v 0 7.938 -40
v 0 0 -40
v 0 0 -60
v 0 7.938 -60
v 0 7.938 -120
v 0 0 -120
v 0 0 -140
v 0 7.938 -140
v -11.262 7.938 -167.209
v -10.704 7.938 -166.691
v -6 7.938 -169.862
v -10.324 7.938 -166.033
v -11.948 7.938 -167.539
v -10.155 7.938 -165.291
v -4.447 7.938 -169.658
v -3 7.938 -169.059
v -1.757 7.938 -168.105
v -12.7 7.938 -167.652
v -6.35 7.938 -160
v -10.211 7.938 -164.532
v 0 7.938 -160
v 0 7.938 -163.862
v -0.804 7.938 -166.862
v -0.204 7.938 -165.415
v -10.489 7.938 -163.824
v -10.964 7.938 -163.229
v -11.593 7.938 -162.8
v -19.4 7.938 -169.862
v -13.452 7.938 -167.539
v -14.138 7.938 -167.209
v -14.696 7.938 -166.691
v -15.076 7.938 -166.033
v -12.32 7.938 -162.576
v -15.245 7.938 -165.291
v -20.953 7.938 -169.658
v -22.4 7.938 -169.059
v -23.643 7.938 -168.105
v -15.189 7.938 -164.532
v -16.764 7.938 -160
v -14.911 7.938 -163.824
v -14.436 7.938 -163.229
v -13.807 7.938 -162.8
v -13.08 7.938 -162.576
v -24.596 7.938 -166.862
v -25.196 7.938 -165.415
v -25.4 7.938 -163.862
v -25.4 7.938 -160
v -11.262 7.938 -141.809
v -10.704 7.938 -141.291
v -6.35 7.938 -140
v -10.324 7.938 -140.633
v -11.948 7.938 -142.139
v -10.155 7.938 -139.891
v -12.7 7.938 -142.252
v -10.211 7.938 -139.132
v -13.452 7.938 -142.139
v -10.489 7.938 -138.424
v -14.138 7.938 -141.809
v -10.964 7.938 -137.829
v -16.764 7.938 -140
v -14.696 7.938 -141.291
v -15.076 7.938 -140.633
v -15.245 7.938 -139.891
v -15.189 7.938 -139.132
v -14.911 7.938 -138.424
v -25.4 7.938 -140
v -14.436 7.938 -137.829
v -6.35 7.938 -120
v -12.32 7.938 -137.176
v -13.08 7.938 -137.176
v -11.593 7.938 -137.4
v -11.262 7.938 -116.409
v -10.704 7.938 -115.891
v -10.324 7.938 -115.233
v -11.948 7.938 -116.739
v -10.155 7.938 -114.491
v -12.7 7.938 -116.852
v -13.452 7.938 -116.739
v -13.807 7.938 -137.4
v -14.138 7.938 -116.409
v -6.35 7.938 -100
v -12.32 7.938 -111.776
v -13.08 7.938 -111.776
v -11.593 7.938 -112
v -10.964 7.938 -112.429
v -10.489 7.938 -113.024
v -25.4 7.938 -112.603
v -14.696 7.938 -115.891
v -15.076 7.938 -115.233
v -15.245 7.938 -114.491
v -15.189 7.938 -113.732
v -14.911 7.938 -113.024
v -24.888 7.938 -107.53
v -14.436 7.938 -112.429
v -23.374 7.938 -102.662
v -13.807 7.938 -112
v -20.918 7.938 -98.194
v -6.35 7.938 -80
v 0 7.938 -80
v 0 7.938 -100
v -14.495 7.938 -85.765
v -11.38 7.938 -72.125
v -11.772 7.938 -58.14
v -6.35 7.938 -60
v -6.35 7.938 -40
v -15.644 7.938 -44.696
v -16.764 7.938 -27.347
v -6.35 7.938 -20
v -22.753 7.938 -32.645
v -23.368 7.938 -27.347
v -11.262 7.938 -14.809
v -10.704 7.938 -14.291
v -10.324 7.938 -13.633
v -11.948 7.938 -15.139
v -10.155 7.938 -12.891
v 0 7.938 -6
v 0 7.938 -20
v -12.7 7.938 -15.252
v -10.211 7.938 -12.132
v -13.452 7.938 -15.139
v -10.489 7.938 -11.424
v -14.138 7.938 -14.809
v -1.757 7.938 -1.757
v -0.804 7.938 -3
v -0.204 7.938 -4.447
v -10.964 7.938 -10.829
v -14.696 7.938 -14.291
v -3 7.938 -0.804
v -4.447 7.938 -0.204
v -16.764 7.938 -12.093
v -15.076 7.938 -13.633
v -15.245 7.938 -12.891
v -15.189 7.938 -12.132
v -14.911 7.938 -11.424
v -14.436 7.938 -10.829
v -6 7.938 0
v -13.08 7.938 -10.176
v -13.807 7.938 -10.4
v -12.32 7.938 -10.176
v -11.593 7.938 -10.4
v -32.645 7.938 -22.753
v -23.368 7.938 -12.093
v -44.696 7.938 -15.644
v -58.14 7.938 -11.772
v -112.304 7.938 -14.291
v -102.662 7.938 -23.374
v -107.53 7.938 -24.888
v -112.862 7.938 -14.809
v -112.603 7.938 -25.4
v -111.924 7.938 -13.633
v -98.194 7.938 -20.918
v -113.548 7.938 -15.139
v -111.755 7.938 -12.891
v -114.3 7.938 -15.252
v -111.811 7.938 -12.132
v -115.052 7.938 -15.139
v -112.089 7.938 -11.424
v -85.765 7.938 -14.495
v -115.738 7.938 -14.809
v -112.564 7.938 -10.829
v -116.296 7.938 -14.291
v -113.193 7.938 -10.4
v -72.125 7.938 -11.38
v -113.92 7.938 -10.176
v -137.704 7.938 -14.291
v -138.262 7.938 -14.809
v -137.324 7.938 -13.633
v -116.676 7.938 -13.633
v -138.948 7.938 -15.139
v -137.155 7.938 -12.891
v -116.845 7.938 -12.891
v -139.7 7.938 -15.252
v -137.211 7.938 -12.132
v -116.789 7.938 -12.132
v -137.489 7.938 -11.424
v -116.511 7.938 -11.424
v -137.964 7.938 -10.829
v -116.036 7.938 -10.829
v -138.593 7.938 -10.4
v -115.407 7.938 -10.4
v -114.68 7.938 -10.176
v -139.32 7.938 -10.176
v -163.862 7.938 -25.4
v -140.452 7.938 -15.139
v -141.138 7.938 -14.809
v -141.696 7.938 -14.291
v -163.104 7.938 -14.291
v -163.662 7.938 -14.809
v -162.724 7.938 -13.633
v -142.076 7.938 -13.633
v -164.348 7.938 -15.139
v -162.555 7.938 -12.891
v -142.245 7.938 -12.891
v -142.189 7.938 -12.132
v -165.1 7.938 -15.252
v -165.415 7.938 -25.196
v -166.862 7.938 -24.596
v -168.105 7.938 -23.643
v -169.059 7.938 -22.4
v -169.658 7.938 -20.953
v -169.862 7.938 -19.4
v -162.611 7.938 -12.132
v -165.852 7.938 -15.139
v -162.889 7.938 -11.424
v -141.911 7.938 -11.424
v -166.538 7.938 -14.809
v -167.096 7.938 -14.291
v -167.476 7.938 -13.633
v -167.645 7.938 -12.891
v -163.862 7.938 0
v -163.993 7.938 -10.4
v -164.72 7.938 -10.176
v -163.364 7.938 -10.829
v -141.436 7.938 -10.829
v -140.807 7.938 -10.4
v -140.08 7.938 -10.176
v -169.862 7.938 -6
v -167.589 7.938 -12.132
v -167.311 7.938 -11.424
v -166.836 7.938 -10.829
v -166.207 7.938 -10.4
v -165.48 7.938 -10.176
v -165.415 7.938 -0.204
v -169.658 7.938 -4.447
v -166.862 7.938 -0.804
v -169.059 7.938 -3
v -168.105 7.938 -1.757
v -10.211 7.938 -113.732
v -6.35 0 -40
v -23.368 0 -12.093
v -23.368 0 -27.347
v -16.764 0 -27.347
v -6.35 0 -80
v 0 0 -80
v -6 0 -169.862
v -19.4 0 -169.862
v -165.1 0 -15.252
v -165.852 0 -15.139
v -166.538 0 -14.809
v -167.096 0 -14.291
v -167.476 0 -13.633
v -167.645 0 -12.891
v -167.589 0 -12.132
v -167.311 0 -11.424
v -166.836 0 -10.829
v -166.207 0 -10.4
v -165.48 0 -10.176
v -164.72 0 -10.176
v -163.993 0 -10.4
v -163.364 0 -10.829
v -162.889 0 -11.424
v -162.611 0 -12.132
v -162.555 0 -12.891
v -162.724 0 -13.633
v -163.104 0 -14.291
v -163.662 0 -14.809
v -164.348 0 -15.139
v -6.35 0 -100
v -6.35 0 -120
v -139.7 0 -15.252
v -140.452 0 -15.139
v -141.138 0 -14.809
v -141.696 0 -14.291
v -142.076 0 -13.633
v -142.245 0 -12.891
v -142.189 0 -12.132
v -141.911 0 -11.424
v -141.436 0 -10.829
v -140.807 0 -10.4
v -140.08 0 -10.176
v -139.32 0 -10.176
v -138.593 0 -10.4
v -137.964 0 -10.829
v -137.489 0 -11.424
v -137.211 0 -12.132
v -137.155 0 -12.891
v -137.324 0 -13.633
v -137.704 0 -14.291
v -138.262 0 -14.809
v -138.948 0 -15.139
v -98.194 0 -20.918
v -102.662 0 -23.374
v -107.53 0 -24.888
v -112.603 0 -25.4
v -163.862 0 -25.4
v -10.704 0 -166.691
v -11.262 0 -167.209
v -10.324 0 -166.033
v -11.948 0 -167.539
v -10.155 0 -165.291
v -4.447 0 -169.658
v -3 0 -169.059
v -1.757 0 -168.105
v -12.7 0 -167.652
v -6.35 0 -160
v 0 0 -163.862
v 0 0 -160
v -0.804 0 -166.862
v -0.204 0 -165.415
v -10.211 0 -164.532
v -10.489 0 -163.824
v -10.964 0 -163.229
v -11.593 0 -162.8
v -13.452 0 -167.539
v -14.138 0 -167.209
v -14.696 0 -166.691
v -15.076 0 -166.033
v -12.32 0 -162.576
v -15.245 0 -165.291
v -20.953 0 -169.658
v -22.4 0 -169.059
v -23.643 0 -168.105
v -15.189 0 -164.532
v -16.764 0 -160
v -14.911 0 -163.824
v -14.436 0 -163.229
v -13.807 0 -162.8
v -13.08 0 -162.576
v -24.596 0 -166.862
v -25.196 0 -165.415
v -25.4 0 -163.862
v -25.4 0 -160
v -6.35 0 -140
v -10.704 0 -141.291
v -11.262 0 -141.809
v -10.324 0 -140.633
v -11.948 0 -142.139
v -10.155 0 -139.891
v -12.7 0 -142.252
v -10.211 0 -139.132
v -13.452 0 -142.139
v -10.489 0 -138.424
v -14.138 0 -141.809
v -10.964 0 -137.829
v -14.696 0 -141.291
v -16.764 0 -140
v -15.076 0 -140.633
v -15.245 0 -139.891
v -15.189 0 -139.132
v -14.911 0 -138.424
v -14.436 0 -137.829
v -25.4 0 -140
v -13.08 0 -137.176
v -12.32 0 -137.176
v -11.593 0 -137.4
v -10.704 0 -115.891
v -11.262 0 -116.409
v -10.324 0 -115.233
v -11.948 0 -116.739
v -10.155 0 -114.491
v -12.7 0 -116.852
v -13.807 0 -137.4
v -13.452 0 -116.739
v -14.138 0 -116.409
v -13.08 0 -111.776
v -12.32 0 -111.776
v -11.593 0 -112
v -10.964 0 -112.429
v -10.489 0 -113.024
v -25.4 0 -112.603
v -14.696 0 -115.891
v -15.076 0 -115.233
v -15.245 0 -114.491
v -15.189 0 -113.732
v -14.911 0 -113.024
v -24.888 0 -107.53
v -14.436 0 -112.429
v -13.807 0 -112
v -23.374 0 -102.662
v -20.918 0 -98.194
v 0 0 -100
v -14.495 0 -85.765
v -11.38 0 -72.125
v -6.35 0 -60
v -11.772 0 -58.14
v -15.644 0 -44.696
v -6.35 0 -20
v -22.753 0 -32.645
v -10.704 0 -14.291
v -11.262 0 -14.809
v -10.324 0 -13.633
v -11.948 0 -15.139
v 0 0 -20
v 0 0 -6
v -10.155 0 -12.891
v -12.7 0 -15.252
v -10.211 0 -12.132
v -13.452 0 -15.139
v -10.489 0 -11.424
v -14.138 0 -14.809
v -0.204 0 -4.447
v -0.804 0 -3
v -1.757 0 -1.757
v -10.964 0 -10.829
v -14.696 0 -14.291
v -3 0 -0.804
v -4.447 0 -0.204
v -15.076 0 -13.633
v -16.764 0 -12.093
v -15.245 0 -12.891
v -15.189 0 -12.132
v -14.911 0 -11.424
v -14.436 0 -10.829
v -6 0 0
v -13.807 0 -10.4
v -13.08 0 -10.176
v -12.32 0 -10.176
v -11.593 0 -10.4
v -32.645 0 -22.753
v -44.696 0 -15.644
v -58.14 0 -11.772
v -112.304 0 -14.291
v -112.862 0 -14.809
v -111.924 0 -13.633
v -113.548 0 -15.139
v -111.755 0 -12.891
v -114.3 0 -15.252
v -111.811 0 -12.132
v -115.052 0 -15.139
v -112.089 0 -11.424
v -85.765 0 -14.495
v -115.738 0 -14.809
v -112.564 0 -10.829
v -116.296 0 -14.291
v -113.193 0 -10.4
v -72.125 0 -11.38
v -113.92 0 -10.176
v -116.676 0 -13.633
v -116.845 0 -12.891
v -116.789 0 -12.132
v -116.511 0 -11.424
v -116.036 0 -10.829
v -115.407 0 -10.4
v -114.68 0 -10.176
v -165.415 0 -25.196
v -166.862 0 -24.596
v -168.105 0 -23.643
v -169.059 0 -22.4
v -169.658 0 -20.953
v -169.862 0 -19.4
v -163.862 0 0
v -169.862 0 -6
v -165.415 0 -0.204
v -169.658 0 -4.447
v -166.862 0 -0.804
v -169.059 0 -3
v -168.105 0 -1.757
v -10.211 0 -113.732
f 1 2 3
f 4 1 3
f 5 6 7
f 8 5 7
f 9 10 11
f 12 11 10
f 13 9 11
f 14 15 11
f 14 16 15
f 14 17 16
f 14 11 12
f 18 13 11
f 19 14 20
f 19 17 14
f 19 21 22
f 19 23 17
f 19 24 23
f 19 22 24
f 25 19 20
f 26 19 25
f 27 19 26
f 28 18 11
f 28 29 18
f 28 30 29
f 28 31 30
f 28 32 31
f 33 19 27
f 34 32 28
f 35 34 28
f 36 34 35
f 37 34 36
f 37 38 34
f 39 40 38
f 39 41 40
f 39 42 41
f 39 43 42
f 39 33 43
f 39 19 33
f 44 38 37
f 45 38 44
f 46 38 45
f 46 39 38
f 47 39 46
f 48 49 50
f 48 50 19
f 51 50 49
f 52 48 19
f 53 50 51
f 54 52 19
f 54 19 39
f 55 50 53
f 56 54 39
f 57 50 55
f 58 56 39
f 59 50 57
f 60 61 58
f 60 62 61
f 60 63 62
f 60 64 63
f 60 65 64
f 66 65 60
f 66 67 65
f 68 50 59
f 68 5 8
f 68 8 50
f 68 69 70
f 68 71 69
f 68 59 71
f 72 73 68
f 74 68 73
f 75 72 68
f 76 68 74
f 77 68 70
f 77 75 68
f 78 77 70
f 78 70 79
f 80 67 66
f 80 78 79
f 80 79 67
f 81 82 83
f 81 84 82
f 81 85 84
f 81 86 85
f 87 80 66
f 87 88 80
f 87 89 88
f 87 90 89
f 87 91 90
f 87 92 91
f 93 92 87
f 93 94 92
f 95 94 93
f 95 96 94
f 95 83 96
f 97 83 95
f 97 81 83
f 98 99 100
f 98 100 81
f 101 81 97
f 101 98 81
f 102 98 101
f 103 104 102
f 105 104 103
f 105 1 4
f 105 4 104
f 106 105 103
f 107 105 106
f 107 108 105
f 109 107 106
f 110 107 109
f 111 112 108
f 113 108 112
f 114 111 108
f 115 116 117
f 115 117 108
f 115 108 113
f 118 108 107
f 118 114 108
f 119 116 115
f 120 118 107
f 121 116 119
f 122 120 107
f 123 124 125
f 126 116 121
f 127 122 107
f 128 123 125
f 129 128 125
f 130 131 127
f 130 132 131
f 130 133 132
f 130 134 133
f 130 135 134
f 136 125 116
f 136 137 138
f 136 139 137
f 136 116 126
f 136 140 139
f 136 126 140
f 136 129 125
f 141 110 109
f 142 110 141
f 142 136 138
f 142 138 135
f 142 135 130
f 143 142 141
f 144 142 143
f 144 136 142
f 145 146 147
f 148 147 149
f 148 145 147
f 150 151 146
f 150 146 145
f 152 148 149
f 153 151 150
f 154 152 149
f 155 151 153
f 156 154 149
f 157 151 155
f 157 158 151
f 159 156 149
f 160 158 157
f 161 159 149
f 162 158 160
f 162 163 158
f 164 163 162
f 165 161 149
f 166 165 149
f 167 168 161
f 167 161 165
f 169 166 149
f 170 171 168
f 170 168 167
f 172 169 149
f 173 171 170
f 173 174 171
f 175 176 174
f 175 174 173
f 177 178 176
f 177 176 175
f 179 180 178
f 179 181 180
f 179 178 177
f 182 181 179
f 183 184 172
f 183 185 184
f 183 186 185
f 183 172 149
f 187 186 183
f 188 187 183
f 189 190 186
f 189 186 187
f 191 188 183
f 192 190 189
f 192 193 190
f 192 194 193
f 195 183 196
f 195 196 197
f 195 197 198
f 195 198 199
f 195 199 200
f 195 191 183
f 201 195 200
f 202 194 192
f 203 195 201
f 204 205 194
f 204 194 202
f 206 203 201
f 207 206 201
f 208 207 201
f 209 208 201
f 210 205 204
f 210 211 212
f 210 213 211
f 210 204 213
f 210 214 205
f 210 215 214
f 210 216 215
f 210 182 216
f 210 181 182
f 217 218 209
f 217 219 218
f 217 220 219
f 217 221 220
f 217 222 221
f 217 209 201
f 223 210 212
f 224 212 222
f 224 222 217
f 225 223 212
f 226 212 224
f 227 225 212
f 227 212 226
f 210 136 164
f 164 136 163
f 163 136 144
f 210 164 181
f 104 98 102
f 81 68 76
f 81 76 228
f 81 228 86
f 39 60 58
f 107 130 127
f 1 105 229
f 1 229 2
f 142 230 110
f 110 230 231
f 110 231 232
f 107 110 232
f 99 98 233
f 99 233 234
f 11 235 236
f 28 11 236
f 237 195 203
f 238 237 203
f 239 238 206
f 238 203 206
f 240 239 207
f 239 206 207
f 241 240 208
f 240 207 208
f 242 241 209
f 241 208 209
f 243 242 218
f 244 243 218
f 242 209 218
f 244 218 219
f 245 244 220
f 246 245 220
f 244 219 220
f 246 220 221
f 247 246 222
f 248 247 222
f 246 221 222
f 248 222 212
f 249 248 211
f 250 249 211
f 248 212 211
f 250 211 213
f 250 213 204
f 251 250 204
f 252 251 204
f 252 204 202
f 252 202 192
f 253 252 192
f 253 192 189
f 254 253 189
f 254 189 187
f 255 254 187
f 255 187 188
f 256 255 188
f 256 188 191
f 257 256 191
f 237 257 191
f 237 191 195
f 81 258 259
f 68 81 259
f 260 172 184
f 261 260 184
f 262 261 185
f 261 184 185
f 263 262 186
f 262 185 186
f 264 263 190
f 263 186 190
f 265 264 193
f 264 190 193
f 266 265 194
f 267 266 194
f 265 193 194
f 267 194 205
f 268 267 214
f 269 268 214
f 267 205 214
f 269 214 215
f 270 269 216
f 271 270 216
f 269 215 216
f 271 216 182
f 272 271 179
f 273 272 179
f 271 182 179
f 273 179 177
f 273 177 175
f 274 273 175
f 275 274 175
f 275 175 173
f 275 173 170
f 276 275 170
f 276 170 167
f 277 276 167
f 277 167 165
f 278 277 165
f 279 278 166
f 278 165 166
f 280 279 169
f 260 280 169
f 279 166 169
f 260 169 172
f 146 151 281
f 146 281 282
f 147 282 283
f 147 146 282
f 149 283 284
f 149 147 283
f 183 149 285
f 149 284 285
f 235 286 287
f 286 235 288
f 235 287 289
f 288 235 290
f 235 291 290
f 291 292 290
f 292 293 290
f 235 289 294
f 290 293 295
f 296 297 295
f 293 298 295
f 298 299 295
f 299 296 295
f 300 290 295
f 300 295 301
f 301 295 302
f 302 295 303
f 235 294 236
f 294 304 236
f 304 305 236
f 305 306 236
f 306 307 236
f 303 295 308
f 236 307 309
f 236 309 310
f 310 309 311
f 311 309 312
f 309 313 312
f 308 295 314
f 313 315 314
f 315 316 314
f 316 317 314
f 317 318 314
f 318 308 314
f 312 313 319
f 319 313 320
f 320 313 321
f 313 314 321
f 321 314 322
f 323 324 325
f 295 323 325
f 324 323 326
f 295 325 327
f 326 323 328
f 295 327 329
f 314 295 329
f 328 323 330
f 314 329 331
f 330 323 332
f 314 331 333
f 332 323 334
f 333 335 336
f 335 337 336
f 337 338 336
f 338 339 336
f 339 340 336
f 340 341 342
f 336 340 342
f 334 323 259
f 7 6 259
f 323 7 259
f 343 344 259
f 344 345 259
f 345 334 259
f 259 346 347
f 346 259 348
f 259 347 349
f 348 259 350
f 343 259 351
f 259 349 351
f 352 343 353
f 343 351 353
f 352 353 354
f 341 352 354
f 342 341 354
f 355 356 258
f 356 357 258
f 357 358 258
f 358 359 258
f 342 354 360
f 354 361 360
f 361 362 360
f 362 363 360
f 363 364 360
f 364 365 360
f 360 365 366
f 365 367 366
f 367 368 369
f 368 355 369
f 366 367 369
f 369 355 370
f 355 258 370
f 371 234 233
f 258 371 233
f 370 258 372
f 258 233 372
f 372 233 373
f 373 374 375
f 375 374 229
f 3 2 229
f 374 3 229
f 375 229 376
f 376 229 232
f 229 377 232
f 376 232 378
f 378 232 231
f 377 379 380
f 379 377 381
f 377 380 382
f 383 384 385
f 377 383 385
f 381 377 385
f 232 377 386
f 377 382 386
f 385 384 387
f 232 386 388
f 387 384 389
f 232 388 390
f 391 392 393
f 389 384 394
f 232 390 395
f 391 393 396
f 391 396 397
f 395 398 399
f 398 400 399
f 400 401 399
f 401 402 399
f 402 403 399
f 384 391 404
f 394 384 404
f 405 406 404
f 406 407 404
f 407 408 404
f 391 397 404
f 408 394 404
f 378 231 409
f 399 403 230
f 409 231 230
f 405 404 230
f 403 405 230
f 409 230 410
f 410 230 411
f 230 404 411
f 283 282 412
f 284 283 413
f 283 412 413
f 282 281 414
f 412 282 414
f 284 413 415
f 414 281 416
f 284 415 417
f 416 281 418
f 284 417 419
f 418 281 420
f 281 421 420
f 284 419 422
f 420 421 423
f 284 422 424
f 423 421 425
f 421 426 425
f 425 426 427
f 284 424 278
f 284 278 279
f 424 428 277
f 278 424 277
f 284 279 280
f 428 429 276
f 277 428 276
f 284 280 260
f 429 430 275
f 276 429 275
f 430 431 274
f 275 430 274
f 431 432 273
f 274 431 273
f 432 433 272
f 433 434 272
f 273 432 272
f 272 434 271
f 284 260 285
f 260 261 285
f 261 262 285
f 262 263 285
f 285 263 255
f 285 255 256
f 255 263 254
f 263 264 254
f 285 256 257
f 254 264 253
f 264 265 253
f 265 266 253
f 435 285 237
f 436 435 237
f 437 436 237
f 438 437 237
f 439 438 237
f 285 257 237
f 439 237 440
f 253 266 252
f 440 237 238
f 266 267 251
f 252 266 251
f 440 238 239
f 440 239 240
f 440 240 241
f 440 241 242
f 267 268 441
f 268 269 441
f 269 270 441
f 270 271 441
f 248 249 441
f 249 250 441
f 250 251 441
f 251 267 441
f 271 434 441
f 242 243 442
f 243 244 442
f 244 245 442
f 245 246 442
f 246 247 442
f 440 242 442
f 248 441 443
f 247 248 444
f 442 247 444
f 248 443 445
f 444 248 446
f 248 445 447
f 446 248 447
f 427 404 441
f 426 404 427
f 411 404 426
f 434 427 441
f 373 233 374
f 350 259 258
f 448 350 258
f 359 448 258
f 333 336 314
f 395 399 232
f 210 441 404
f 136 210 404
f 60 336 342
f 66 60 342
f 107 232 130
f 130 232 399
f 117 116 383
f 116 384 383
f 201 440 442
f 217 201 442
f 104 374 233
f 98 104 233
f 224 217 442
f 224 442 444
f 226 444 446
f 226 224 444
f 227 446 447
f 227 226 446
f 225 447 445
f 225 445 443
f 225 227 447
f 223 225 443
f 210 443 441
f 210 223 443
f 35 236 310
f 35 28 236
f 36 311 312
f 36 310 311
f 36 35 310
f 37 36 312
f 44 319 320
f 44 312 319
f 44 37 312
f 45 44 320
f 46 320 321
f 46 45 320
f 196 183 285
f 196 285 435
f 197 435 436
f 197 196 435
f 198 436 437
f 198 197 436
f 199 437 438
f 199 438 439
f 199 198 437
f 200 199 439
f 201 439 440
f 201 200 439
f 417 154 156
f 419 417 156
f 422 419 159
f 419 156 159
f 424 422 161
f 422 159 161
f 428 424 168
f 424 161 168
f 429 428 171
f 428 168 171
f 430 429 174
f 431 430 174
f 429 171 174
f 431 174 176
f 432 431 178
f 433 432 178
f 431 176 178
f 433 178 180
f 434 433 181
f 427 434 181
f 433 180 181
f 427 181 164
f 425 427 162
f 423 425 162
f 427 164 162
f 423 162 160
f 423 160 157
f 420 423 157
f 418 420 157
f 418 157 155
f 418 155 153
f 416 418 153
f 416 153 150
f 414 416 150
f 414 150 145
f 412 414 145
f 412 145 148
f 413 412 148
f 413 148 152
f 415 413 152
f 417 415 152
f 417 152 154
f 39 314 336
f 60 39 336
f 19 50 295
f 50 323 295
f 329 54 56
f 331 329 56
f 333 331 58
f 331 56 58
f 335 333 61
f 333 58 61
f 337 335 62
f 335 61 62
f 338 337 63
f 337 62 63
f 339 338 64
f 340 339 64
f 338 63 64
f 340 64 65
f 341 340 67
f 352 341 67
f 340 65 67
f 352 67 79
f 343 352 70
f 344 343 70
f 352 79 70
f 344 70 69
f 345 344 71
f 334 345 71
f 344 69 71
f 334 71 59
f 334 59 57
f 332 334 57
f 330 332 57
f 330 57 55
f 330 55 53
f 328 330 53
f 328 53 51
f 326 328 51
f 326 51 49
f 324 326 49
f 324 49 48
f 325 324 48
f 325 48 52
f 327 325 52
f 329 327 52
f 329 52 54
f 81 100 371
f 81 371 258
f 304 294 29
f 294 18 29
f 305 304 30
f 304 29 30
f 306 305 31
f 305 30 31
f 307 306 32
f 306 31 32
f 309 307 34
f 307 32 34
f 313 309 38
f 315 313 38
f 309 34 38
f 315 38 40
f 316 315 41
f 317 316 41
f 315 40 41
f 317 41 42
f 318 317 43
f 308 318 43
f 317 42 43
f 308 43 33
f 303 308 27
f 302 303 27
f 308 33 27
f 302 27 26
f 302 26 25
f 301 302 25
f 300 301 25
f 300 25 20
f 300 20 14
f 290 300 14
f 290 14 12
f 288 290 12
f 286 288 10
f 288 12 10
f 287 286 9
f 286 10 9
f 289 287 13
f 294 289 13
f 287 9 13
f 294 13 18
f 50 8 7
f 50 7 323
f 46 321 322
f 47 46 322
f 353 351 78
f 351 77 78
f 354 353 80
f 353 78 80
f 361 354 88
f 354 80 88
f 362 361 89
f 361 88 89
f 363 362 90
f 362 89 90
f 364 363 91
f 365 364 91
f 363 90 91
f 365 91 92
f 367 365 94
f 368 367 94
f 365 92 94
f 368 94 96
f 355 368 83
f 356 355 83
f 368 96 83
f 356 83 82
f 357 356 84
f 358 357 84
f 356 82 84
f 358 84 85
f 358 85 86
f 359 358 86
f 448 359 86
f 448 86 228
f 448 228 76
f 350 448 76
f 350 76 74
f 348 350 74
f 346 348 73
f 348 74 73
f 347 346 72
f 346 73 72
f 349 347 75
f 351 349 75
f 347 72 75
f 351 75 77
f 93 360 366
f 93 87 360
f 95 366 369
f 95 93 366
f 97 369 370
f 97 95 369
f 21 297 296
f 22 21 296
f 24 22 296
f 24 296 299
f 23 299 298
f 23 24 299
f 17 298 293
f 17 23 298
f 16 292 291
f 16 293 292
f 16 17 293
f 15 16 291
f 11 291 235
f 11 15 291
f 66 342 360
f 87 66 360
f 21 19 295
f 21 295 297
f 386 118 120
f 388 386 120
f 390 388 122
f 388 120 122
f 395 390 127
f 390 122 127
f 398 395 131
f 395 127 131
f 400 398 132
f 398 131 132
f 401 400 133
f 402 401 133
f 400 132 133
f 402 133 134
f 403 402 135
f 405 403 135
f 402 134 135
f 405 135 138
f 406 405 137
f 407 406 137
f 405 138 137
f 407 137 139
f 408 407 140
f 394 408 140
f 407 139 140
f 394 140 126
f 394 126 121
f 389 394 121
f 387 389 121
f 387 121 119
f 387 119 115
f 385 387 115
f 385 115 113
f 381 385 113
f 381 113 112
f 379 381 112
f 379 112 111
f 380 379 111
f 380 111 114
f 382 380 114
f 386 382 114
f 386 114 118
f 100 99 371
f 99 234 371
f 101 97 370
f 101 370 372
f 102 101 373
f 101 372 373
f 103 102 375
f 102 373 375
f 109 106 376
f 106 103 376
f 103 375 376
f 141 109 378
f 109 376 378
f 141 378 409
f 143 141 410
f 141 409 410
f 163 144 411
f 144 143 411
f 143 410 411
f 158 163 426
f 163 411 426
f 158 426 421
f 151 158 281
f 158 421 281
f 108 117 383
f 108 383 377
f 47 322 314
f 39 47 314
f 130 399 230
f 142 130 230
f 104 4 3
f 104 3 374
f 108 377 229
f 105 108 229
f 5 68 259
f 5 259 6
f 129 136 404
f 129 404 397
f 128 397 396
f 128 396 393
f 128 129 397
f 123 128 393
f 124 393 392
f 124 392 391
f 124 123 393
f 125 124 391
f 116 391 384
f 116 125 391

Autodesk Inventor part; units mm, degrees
ref_plane "YZ Plane" through (0, 0, 0) normal (1, 0, 0) x (0, 1, 0)
ref_plane "XZ Plane" through (0, 0, 0) normal (0, 1, 0) x (-1, 0, 0)
ref_plane "XY Plane" through (0, 0, 0) normal (0, 0, 1) x (1, 0, 0)
sketch "Sketch1" plane through (0, 0, 0) normal (0, 1, 0) x (-1, 0, 0)
  line L0 (169.8625, 0) -> (0, 0)
  line L1 (0, 0) -> (0, -169.8625)
  line L2 (0, -169.8625) -> (25.4, -169.8625)
  line L3 (25.4, -169.8625) -> (25.4, -103.8713)
  line L4 (103.8713, -25.4) -> (169.8625, -25.4)
  line L5 (169.8625, -25.4) -> (169.8625, 0)
  arc A0 (103.8713, -25.4) -> (25.4, -103.8713) centre (66.675, -66.675) ccw
  line L6 (0, 0) -> (66.675, -66.675) construction
  line L7 (0, -20) -> (6.35, -20)
  line L8 (6.35, -20) -> (6.35, -40)
  line L9 (6.35, -40) -> (0, -40)
  line L10 (0, -40) -> (0, -20)
  line L11 (6.35, -60) -> (6.35, -80)
  line L12 (0, -60) -> (6.35, -60)
  line L13 (6.35, -80) -> (0, -80)
  line L14 (6.35, -100) -> (6.35, -120)
  line L15 (0, -100) -> (6.35, -100)
  line L16 (6.35, -120) -> (0, -120)
  line L17 (6.35, -140) -> (6.35, -160)
  line L18 (0, -140) -> (6.35, -140)
  line L19 (6.35, -160) -> (0, -160)
  line L20 (23.368, -27.3469) -> (16.764, -27.3469)
  line L21 (16.764, -27.3469) -> (16.764, -12.0929)
  line L22 (16.764, -12.0929) -> (23.368, -12.0929)
  line L23 (23.368, -12.0929) -> (23.368, -27.3469)
  line L24 (23.368, -27.3469) -> (16.764, -12.0929) construction
  line L25 (16.764, -27.3469) -> (23.368, -12.0929) construction
  line L26 (25.4, -160) -> (16.764, -160)
  line L27 (16.764, -160) -> (16.764, -140)
  line L28 (16.764, -140) -> (25.4, -140)
  point P0 (103.8713, -25.4)
  point P1 (20.066, -19.7199)
  point P2 (20.066, -12.0929)
  dimension "d0" = 25.4
  dimension "d1" = 169.8625
  dimension "d2" = 25.4
  dimension "d3" = 169.8625
  dimension "d4" = 111.125
  dimension "d5" = 66.675
  dimension "d6" = 45
  dimension "d10" = 6.35
  dimension "d11" = 20
  dimension "d12" = 20
  dimension "d15" = 40
  dimension "d34" = 12.0929
  dimension "d35" = 6.604
  dimension "d36" = 20.066
  dimension "d37" = 15.254
extrude "Plate1" add sketch "Sketch1" along normal blind 7.9375 contours L5 L4 A0 L3 L28 L27 L26 L2 L1 L19 L17 L18 L16 L14 L15 L13 L11 L12 L9 L8 L7 L0
fillet "Corner Round1" radius 25.4 2 edges at (-103.8713, 3.9688, -25.4) (-25.4, 3.9688, -103.8713)
fillet "Corner Round2" radius 6 5 edges at (0, 3.9688, 0) (0, 3.9688, -169.8625) (-25.4, 3.9688, -169.8625) (-169.8625, 3.9688, 0) (-169.8625, 3.9688, -25.4)
sketch "Sketch2" plane through (0, 0, 0) normal (0, -1, 0) x (1, 0, 0)
  line L0 (-169.8625, -19.4) -> (-169.8625, -6) projected
  line L1 (-19.4, -169.8625) -> (-6, -169.8625) projected
  line L2 (-6, -169.8625) -> (-19.4, -169.8625) projected
  line L3 (0, -20) -> (0, -6) projected
  line L4 (-6, 0) -> (-163.8625, 0) projected
  point P0 (0, 0)
  point P1 (-165.1, -12.7)
  point P2 (-139.7, -12.7)
  point P3 (-114.3, -12.7)
  point P4 (-12.7, -165.1)
  point P5 (-12.7, -139.7)
  point P6 (-12.7, -114.3)
  point P7 (-169.8625, -12.7)
  point P8 (-169.8625, -12.7)
  point P9 (-12.7, -169.8625)
  point P10 (-12.7, -12.7)
  dimension "d21" = 25.4
  dimension "d22" = 25.4
  dimension "d23" = 25.4
  dimension "d24" = 25.4
  dimension "d25" = 4.7625
  dimension "d26" = 4.7625
  dimension "d38" = 12.7
  dimension "d39" = 12.7
hole "Hole1" at (-165.1, 0, -12.7) at (-139.7, 0, -12.7) at (-114.3, 0, -12.7) at (-12.7, 0, -165.1) at (-12.7, 0, -139.7) at (-12.7, 0, -114.3) at (-12.7, 0, -12.7) direction (0, 1, 0) diameter 5.105 depth 7.9375 tip angle 118 clearance for "Flat Head Machine Screw (82)" size "#10" standard "Ansi Unified Screw Threads"
equation "\"d22\" = d21"
equation "\"d23\" = d21"
equation "\"d24\" = d23"
equation "\"d2\" = d0"
equation "\"d3\" = d1"
equation "\"d12\" = d11"
equation "\"d15\" = 2 * d11"
equation "\"d32\" = Thickness"
equation "\"d8\" = Thickness"
equation "\"BendRadius\" = Thickness"
equation "\"BendReliefWidth\" = Thickness"
equation "\"BendReliefDepth\" = 0.5 * Thickness"
equation "\"CornerReliefSize\" = 4 * Thickness"
equation "\"MinimumRemnant\" = 2 * Thickness"
equation "\"TransitionRadius\" = BendRadius"
equation "\"JacobiRadiusSize\" = BendRadius"
equation "\"GapSize\" = Thickness"
equation "\"Thickness\" = 7.9375"
properties part number "INTAKE_SWERVE_MOUNT" material "Aluminum, 6061-T6"
